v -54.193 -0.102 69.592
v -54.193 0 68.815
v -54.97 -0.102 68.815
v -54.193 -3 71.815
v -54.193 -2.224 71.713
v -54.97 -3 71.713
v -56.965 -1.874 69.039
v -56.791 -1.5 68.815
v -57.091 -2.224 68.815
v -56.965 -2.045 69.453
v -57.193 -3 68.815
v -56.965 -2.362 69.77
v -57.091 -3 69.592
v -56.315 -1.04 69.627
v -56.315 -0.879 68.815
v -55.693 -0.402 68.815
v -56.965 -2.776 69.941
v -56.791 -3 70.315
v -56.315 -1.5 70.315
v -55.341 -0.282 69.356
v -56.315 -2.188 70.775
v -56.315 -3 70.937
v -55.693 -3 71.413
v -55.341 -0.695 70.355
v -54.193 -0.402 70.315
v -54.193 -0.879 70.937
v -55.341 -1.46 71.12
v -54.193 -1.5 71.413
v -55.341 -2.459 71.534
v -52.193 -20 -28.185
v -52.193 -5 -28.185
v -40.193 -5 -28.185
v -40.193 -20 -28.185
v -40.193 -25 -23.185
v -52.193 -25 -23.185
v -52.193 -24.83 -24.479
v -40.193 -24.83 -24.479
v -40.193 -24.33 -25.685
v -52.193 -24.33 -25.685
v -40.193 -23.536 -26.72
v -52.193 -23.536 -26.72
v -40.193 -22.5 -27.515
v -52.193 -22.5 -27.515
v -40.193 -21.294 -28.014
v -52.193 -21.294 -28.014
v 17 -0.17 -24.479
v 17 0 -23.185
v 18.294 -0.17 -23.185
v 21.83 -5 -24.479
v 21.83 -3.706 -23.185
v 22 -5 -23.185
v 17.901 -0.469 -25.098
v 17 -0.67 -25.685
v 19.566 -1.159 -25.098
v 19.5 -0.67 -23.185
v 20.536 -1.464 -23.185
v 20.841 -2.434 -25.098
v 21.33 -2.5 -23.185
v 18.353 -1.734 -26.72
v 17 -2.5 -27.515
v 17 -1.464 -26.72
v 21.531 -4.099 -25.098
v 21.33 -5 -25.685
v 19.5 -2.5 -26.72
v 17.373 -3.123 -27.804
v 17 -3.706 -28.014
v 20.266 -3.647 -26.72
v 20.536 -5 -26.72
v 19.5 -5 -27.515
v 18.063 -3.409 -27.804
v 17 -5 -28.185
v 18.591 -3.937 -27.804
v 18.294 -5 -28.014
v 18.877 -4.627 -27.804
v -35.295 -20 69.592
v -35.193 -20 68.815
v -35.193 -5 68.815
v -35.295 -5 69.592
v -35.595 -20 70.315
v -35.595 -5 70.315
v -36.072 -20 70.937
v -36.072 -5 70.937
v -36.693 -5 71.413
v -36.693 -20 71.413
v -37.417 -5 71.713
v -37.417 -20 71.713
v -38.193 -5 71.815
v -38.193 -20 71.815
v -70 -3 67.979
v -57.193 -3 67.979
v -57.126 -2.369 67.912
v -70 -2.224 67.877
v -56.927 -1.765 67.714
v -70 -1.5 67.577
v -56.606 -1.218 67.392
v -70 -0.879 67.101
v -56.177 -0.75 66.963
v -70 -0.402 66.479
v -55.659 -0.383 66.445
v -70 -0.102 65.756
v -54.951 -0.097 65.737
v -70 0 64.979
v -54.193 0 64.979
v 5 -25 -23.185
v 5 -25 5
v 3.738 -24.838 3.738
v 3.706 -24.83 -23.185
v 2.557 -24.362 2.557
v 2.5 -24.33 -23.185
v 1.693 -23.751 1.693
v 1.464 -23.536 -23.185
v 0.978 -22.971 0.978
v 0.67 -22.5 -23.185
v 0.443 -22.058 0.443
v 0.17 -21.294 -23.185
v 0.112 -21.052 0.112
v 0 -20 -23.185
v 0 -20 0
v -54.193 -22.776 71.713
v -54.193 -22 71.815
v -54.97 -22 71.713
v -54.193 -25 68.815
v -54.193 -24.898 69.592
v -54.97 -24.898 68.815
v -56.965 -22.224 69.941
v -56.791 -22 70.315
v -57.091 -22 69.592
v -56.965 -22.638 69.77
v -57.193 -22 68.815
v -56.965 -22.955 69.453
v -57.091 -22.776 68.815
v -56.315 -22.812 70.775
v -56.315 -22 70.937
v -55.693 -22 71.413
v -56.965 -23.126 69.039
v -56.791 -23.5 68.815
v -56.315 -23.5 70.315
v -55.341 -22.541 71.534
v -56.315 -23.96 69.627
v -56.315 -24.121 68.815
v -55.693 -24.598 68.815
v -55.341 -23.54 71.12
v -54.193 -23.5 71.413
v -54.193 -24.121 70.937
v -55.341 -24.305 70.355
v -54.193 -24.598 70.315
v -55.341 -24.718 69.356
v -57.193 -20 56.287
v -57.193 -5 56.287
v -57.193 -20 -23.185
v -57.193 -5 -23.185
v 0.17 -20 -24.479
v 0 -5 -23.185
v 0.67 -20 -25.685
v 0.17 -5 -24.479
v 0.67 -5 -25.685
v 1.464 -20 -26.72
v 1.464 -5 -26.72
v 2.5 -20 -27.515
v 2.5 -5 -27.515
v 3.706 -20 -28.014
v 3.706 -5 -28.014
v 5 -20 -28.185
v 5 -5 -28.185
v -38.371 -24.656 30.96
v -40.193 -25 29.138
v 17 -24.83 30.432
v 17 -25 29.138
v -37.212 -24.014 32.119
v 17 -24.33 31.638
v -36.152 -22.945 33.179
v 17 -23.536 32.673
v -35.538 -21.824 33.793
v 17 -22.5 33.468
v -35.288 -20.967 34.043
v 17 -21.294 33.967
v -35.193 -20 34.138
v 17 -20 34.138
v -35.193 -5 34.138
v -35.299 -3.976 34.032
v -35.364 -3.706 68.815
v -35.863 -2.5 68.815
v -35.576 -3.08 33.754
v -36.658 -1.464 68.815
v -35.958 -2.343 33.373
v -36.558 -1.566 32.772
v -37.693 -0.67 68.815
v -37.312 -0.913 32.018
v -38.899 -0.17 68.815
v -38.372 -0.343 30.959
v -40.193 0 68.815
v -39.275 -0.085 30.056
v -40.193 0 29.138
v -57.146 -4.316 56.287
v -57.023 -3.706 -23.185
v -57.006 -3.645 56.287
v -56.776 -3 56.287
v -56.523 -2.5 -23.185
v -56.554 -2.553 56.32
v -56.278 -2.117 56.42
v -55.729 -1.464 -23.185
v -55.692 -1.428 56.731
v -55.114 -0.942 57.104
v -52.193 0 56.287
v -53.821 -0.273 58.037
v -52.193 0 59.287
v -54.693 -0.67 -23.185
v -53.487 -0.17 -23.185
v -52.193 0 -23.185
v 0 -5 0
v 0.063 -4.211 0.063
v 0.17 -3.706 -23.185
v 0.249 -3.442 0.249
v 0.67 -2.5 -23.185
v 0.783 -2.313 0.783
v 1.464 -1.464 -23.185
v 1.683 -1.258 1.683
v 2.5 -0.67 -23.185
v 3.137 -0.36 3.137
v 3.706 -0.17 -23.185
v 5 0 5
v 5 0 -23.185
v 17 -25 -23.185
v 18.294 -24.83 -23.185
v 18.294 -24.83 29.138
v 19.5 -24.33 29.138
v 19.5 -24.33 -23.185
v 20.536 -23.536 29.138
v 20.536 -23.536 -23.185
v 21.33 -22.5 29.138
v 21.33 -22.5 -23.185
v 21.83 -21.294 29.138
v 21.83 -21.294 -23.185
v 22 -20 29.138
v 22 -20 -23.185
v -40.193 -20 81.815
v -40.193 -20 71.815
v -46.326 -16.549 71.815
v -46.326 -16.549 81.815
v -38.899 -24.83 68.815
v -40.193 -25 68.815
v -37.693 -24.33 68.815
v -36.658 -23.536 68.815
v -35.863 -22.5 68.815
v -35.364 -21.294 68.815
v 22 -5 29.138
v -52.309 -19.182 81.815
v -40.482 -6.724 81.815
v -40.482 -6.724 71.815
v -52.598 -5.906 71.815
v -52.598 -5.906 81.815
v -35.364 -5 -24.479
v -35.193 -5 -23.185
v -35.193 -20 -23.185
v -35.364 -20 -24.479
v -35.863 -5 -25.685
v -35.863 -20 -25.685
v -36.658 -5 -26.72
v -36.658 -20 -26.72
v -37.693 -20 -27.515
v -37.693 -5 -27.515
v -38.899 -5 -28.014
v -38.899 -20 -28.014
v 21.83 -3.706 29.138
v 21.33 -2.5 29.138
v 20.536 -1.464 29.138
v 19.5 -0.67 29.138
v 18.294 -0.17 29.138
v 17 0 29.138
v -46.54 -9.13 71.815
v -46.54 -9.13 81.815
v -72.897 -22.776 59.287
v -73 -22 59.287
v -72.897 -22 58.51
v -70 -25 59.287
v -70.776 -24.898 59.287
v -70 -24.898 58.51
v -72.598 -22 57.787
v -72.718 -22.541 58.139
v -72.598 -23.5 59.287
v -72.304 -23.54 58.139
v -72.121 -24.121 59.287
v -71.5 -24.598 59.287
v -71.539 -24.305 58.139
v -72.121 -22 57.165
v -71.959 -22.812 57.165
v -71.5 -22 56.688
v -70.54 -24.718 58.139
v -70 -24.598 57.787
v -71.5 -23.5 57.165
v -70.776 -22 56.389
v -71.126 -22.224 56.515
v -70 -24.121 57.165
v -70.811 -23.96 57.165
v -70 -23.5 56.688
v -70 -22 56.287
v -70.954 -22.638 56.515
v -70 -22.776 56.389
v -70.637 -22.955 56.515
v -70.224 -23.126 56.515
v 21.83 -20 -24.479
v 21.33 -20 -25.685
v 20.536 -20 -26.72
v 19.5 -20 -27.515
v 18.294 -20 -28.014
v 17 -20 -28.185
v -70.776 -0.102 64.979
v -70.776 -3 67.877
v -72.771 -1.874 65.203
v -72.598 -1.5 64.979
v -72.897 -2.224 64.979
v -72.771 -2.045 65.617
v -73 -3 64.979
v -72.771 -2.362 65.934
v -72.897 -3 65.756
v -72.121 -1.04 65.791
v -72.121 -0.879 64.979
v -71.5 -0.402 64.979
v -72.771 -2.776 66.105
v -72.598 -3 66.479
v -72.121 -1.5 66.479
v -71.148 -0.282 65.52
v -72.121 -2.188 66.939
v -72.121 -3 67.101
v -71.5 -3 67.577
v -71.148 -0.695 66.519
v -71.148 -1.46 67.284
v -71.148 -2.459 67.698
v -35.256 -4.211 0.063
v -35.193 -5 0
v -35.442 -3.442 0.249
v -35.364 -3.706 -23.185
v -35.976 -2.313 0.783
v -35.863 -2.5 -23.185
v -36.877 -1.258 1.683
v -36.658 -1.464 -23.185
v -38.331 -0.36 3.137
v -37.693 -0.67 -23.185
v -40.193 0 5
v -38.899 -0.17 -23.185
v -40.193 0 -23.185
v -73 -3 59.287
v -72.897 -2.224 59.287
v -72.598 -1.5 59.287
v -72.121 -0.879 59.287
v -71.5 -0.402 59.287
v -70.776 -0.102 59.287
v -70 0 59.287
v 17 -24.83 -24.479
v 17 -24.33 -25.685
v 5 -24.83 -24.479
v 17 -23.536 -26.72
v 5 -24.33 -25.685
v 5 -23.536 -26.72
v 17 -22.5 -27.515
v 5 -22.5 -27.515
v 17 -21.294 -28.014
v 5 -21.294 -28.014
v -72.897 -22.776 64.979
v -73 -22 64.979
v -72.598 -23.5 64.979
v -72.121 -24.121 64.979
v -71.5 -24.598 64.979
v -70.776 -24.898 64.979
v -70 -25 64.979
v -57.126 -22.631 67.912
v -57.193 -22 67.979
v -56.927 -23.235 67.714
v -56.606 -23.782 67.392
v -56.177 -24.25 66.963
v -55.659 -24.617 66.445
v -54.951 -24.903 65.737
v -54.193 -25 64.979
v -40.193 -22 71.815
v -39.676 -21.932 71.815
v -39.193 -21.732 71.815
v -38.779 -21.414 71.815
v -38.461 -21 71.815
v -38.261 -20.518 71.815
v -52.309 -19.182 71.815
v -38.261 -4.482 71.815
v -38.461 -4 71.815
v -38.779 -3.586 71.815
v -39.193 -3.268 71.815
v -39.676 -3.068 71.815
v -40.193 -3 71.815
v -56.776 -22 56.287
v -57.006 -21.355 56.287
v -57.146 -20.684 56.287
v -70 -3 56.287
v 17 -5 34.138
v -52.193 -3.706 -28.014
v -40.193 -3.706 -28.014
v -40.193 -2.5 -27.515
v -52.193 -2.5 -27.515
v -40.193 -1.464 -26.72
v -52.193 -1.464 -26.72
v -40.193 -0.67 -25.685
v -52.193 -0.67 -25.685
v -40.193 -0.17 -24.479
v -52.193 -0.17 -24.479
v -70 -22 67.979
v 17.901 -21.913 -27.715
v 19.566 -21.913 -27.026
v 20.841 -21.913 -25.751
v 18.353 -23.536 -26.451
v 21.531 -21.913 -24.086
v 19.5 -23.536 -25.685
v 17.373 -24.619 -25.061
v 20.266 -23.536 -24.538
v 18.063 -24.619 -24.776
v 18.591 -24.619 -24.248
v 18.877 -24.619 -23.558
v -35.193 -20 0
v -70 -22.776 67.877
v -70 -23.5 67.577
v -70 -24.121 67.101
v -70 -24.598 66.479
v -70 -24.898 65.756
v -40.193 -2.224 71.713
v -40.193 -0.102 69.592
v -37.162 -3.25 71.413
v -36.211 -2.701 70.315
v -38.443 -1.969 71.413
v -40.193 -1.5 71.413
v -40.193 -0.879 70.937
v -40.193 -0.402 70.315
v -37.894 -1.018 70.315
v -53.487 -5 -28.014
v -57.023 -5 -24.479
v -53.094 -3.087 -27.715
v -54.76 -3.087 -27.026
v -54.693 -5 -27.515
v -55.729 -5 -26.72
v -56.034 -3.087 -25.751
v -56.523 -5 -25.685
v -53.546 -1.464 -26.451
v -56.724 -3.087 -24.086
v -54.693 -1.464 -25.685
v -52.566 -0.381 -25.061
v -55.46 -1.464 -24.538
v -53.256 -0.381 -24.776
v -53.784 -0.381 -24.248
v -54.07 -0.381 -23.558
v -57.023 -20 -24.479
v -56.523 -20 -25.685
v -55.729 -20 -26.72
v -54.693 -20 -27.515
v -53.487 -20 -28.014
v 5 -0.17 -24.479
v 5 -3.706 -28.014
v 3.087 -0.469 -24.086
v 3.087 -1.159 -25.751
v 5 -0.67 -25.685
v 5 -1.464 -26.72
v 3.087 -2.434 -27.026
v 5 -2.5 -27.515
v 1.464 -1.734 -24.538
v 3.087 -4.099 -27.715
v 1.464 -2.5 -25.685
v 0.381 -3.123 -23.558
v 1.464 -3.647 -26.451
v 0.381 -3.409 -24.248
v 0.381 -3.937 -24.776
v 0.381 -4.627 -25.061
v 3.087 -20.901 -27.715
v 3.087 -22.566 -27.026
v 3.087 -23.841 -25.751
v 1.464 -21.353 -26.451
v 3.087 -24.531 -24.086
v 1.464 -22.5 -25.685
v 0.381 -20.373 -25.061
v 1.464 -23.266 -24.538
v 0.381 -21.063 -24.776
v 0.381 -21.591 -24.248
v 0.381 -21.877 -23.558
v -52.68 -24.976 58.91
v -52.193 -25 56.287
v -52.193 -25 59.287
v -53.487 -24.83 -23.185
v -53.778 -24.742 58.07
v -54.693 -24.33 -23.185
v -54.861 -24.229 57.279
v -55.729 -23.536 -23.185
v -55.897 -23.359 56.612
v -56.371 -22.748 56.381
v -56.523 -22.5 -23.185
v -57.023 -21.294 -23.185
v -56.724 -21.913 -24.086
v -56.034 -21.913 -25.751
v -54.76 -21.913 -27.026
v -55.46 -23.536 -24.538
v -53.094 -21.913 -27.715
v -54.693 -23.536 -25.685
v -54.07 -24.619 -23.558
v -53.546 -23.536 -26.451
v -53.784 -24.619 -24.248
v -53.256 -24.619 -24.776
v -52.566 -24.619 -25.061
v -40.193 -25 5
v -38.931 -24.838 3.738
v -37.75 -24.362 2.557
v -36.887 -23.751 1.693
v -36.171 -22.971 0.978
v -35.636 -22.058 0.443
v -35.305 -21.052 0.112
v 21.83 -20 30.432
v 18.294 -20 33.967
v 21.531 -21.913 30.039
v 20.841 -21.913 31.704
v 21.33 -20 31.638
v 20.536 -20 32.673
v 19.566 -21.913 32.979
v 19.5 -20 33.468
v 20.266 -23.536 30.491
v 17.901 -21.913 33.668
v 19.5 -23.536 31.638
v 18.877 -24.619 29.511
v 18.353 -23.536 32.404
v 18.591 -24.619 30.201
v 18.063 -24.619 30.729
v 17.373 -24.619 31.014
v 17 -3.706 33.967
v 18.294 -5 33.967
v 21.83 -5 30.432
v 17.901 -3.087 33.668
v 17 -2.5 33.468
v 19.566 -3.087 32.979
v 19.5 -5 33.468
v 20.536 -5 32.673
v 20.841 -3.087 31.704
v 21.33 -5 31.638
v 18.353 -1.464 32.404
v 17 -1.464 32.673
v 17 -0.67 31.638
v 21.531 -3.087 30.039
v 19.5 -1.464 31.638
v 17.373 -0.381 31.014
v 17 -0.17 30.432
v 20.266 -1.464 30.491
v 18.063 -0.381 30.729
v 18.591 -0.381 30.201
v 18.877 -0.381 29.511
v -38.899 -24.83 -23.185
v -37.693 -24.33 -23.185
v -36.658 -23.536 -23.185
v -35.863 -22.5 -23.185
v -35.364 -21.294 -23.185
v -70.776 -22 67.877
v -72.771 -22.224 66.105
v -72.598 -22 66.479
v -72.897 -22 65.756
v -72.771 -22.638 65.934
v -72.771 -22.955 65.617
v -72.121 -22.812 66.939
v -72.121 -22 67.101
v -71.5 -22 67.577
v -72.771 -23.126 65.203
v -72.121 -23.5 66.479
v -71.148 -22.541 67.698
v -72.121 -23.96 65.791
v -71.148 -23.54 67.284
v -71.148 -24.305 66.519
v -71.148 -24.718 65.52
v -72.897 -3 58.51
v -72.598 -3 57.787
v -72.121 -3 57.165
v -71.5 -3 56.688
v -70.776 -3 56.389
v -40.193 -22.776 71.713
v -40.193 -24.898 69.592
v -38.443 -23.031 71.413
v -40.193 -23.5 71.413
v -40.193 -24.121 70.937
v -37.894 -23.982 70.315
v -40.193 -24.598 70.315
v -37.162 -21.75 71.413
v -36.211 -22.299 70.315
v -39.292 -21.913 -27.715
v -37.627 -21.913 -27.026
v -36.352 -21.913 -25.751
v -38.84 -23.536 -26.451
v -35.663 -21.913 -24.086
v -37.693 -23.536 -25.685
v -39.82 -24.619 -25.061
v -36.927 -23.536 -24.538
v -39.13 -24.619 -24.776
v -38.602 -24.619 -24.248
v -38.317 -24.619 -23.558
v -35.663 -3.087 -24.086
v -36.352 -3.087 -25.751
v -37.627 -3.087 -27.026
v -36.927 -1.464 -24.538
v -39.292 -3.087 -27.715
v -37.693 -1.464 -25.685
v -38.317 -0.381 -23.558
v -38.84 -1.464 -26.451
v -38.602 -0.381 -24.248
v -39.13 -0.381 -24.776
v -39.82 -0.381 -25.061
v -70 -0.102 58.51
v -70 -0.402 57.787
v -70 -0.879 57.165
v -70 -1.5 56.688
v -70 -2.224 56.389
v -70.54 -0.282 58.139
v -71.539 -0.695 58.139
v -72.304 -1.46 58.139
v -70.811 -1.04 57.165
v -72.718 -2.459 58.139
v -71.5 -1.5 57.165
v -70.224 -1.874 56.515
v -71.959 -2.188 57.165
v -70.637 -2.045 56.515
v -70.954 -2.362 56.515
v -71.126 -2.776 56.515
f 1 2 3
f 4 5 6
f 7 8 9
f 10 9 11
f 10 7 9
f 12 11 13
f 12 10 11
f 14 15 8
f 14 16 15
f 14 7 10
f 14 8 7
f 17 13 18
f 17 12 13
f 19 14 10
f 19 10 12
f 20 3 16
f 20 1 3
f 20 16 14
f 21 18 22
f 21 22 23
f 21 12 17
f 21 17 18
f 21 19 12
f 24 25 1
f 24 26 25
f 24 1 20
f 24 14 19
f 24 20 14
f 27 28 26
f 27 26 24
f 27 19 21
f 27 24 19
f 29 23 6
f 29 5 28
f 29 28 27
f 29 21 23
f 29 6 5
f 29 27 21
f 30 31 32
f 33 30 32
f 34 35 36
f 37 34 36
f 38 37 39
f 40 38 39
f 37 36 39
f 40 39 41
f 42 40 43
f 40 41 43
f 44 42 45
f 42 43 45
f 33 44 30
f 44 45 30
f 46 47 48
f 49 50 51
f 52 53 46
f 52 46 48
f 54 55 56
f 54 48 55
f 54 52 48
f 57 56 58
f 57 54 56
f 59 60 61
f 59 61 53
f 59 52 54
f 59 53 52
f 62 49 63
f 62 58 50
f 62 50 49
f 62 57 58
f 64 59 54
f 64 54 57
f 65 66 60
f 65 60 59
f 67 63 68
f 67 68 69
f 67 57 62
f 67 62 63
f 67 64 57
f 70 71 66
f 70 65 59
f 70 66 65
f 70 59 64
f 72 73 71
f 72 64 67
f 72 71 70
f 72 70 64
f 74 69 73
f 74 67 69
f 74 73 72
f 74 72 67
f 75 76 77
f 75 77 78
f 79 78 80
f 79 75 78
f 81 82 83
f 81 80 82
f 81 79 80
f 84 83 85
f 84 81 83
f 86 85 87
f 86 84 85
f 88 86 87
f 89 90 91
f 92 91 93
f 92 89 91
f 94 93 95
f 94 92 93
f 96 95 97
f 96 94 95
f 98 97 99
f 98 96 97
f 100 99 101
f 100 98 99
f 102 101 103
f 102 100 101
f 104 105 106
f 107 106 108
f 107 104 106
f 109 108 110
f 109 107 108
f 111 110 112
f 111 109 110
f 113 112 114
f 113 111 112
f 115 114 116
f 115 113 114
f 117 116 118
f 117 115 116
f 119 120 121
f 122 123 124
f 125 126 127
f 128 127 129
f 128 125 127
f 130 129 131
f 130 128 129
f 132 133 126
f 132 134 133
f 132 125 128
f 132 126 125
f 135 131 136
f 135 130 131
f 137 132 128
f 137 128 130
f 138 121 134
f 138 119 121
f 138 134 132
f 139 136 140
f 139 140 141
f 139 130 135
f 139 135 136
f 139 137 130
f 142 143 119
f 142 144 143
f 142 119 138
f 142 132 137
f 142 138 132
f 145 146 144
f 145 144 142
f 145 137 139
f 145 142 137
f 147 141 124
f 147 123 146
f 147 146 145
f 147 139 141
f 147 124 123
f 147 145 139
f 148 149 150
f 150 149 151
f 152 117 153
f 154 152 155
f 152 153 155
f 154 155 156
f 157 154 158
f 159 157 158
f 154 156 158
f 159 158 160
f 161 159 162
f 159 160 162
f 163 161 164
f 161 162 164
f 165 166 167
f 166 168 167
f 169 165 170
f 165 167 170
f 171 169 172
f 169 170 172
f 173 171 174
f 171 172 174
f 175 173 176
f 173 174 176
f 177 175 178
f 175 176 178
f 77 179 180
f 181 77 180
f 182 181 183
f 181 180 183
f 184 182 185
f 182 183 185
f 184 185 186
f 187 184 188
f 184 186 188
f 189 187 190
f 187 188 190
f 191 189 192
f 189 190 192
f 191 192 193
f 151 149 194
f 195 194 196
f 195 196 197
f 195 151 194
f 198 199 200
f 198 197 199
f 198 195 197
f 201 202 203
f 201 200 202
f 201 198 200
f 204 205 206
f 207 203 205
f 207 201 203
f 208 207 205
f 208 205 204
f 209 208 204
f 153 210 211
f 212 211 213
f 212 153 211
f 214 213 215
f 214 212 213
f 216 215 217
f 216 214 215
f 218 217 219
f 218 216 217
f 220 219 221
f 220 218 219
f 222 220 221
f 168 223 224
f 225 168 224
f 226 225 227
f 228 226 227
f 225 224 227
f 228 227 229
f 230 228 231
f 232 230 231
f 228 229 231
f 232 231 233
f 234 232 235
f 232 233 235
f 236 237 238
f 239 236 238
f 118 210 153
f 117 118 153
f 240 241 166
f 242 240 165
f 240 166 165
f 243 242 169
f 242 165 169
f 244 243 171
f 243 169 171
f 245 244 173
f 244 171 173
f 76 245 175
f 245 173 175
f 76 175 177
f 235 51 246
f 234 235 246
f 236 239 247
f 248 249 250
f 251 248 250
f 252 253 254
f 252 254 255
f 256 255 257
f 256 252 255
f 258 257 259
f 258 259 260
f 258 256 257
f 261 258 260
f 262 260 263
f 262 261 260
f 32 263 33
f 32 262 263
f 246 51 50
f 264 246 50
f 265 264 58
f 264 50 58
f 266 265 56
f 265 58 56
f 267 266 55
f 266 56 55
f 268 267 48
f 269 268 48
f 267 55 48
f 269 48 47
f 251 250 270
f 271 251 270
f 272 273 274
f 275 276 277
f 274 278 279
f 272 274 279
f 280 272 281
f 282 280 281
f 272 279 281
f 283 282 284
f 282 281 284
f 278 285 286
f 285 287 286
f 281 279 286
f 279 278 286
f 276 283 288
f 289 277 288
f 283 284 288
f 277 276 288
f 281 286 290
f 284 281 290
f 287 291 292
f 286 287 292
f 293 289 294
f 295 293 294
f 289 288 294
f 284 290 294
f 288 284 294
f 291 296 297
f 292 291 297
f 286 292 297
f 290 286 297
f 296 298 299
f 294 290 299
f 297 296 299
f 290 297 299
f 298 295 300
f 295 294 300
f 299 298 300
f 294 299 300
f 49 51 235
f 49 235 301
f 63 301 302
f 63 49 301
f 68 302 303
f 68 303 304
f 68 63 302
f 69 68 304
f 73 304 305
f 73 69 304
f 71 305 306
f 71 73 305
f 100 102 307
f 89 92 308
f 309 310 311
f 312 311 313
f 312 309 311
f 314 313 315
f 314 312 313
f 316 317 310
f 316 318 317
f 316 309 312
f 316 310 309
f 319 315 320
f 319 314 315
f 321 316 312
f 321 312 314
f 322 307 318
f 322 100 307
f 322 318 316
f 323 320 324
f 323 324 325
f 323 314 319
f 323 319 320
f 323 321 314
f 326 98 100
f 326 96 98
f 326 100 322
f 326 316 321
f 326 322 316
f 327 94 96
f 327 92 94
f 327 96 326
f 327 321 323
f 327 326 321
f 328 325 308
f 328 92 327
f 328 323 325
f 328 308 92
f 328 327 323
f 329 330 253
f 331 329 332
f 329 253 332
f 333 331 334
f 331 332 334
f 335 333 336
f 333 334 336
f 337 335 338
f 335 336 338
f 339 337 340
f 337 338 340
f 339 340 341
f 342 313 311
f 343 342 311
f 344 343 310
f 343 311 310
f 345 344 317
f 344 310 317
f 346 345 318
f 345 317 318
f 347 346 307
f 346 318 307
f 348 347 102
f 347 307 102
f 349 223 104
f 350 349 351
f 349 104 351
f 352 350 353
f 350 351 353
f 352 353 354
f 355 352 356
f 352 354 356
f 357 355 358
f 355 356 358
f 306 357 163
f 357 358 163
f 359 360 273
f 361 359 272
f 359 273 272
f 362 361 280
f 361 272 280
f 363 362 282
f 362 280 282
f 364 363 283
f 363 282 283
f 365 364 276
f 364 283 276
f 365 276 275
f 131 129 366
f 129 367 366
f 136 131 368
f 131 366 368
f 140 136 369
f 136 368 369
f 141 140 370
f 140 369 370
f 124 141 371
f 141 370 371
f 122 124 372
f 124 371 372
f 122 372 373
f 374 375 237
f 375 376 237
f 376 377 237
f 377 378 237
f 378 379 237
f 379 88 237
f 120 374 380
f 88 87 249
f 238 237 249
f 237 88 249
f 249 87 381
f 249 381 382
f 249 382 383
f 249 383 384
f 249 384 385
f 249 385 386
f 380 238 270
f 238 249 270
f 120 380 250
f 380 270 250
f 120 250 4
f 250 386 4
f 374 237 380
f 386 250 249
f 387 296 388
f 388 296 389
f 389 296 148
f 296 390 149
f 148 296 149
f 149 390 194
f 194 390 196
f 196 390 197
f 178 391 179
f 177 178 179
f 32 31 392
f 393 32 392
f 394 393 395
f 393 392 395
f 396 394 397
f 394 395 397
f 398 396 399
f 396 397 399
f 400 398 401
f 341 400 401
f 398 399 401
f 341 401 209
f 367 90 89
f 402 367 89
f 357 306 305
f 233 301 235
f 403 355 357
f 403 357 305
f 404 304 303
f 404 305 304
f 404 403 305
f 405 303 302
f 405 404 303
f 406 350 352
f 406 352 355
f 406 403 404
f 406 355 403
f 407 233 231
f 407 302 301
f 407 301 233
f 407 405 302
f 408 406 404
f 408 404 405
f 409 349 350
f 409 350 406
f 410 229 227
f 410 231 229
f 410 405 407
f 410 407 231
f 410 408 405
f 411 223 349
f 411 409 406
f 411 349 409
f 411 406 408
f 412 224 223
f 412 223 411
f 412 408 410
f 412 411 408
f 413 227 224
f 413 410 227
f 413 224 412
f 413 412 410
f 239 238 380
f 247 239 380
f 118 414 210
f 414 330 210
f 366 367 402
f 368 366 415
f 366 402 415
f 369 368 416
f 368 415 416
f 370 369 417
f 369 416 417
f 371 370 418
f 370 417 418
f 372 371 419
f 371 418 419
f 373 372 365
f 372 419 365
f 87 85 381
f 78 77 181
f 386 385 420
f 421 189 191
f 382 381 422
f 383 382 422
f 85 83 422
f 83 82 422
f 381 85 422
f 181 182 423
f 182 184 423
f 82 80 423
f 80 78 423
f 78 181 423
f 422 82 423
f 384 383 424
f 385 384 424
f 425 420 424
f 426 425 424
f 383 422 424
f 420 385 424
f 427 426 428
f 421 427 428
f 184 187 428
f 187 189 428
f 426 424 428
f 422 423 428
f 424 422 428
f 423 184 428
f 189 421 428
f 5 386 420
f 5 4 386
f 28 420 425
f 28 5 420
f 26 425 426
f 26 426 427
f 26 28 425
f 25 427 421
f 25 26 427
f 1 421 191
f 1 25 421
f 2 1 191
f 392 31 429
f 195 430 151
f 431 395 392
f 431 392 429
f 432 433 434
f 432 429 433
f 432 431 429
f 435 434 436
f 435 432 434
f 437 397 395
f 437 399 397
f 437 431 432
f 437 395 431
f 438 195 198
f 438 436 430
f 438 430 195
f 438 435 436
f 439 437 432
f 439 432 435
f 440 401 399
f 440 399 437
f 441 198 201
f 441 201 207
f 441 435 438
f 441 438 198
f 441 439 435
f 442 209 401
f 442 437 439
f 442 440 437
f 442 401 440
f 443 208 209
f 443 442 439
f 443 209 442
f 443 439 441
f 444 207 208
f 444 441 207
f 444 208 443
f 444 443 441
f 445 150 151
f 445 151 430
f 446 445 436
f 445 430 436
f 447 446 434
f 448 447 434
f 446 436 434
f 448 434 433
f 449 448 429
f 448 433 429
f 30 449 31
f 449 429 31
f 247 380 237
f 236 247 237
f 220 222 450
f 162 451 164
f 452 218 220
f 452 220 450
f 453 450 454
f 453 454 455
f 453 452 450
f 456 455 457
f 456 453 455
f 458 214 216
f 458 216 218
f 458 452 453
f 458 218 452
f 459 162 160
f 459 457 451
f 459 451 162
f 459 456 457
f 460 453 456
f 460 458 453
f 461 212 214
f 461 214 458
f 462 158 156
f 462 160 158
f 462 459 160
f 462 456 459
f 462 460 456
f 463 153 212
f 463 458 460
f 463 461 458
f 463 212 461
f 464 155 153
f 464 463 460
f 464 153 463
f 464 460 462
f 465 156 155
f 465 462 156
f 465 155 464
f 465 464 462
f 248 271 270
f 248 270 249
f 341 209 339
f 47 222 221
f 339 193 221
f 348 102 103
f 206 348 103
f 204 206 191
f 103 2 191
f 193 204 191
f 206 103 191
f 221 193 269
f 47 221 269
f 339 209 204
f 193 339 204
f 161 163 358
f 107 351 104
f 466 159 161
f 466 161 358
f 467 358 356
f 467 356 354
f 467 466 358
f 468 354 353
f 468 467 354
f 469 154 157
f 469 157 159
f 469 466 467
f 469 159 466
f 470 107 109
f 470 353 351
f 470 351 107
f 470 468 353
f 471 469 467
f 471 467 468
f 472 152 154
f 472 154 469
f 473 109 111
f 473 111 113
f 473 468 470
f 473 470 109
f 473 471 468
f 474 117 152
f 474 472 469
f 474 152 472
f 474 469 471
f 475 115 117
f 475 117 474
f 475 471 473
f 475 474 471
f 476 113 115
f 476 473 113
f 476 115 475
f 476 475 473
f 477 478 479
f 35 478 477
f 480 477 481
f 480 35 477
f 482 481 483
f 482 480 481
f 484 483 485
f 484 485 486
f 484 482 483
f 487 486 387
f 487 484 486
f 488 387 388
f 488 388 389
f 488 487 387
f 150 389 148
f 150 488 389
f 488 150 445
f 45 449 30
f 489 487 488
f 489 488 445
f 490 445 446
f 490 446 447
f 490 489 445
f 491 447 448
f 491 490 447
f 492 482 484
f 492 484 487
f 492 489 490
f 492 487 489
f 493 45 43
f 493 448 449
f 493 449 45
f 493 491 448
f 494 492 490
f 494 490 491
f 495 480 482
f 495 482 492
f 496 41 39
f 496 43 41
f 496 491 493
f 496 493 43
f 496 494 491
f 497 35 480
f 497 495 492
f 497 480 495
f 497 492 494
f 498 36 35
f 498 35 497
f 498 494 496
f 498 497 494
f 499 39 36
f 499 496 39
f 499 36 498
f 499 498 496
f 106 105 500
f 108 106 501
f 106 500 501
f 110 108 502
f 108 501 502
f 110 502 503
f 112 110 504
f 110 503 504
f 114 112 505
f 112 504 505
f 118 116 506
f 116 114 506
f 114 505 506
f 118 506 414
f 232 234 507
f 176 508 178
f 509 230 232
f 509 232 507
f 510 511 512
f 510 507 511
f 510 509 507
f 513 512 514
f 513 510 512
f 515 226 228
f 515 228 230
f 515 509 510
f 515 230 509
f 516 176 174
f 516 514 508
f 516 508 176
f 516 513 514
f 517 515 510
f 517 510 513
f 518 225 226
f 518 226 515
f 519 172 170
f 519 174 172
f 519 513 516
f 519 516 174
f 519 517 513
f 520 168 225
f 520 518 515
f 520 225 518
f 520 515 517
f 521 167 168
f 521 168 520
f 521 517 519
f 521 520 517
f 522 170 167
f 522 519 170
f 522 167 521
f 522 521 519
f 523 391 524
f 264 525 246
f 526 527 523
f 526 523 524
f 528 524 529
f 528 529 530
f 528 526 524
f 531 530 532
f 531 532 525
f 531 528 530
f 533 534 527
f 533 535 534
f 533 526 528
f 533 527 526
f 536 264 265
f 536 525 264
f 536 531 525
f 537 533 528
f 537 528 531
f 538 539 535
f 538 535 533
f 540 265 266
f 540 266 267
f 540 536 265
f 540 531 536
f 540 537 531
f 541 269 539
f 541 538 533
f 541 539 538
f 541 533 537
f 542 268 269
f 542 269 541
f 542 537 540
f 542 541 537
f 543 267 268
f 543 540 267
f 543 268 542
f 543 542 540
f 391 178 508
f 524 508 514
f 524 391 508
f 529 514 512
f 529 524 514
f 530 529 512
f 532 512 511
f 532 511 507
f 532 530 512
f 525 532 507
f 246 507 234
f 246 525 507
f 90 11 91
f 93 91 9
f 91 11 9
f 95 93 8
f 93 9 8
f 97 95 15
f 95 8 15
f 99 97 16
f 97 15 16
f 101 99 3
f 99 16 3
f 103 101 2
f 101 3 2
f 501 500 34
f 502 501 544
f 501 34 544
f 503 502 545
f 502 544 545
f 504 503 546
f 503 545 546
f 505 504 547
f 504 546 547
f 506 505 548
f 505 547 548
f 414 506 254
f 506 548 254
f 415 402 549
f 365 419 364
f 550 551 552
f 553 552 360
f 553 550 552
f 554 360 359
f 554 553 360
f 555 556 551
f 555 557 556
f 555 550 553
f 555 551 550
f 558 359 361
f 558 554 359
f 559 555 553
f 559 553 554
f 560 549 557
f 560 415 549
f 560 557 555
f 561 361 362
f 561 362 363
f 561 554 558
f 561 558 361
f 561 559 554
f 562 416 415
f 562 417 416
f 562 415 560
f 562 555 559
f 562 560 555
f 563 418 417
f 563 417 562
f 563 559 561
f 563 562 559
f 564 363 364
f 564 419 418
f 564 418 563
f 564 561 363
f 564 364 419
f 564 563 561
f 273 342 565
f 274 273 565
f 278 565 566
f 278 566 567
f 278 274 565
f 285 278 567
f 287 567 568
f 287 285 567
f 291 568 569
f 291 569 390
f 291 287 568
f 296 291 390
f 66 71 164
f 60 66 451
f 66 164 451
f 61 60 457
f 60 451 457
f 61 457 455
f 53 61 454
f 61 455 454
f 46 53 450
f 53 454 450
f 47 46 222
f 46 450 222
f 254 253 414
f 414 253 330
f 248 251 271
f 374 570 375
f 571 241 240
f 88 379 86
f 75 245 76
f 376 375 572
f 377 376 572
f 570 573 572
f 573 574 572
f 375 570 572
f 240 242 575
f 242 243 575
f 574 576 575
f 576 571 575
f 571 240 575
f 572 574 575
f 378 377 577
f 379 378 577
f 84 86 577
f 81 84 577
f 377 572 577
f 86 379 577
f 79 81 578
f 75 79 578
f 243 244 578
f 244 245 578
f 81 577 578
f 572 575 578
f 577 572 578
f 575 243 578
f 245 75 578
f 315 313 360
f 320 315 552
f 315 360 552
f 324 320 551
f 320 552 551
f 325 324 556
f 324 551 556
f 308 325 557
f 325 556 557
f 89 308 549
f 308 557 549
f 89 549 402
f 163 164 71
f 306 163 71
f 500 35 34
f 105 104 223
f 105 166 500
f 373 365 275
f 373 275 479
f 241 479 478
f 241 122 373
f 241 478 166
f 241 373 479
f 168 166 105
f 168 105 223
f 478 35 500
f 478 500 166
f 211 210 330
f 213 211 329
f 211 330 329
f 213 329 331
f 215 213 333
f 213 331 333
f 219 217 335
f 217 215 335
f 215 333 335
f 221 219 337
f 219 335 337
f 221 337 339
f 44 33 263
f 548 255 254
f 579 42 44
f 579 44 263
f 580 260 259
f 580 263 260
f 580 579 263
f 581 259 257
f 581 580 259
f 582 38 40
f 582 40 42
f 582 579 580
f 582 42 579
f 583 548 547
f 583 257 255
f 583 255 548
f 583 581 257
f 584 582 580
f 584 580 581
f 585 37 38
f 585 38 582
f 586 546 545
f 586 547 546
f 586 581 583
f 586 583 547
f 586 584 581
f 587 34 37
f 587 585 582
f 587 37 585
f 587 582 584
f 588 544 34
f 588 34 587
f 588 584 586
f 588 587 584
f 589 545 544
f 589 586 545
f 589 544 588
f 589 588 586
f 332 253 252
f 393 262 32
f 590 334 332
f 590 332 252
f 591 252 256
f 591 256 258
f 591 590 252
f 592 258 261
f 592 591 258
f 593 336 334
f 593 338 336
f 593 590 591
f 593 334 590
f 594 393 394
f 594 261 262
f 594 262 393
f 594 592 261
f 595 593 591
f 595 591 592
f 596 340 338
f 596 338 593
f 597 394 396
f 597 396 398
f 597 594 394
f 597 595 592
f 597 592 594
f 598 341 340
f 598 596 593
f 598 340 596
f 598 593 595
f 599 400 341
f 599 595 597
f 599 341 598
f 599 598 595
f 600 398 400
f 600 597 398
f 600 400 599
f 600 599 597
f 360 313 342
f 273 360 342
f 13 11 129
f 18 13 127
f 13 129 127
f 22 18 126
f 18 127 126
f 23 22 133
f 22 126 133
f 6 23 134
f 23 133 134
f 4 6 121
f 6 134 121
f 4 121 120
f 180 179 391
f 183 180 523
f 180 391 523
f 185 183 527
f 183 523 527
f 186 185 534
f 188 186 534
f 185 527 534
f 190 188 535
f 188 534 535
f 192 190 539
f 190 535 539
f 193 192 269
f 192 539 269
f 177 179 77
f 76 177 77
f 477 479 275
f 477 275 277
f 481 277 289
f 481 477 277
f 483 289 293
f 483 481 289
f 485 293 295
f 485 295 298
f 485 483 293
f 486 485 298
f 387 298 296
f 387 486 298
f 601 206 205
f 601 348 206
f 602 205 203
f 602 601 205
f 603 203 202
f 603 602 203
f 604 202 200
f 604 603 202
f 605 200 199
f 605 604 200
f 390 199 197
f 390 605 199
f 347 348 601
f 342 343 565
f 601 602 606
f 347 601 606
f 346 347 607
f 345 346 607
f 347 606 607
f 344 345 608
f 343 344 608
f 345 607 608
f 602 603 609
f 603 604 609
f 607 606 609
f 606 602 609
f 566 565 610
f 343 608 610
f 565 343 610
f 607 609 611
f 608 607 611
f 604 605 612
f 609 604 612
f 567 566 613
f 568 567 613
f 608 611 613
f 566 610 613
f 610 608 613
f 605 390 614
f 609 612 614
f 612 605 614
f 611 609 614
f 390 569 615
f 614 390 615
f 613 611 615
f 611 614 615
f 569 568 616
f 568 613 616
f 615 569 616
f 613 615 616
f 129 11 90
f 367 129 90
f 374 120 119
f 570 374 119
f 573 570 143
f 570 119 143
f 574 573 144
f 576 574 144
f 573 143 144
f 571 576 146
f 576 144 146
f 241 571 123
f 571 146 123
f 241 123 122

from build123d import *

# Parameters (mm, degrees)
F1_DEPTH      = 25
F2_R          = 3
F3_R          = 3
F4_T1_DEPTH   = 52.1931828042
F4_T3_DEPTH   = 15
F4_T5_DEPTH   = 52.3223032383
F4_T7_DEPTH   = 40.6846483105
F4_T9_DEPTH   = 79.471221308
F4_T11_DEPTH  = 23.1846483105
F4_T13_DEPTH  = 35.1931828042
F4_T15_DEPTH  = 12
F4_T17_DEPTH  = 29.5
F4_T19_DEPTH  = 37.6776967617
F4_T22_ANGLE  = 90
F4_T24_ANGLE  = 90
F4_S27_W      = 5.1
F4_S27_H      = 5.1
F4_T28_DEPTH  = 5.1
F4_S33_W      = 5.1
F4_S33_H      = 5.1
F4_T34_DEPTH  = 5.1
F4_S39_W      = 5.1
F4_S39_H      = 5.1
F4_T40_DEPTH  = 5.1
F4_S45_W      = 5.1
F4_S45_H      = 5.1
F4_T46_DEPTH  = 5.1
F4_S51_W      = 5.1
F4_S51_H      = 5.1
F4_T52_DEPTH  = 5.1
F4_S57_W      = 5.1
F4_S57_H      = 5.1
F4_T58_DEPTH  = 5.1
F4_S63_W      = 5.1
F4_S63_H      = 5.1
F4_T64_DEPTH  = 5.1
F4_S69_W      = 5.1
F4_S69_H      = 5.1
F4_T70_DEPTH  = 5.1
F4_T77_DEPTH  = 50.1776967617
F4_T81_DEPTH  = 64.6931828042
F4_T88_DEPTH  = 50.1776967617
F4_T92_DEPTH  = 64.6931828042
F4_T99_DEPTH  = 40.6846483105
F4_T103_DEPTH = 47.6931828042
F4_T110_DEPTH = 40.6846483105
F4_T114_DEPTH = 47.6931828042
F4_T121_DEPTH = 47.6931828042
F4_T125_DEPTH = 35.6846483105
F4_T132_DEPTH = 47.6931828042
F4_T136_DEPTH = 35.6846483105
F5_R          = 3
F6_T1_DEPTH   = 15
F6_S5_W       = 5
F6_S5_H       = 5
F6_T6_DEPTH   = 5
F6_S11_W      = 5
F6_S11_H      = 5
F6_T12_DEPTH  = 5
F8_DEPTH      = 10


# Not quite as in the source:
# - a fillet or chamfer that OpenCascade refuses, or shapes differently, is made with other operations: its cross-section is extruded or revolved along the edge and cut away or added


with BuildPart() as f1:
    # F0 (on Front) → F1 (new body)
    with BuildSketch(Plane.XZ):
        Polygon((-57.1931828042, 56.2865729975), (-57.1931828042, -28.1846483105), (-35.1931828042, -28.1846483105), (-35.1931828042, 0), (0, 0), (0, -28.1846483105), (22, -28.1846483105), (22, 0), (22, 34.1376549277), (-35.1931828042, 34.1376549277), (-35.1931828042, 71.8153516895), (-57.1931828042, 71.8153516895), (-57.1931828042, 67.9793483567), (-72.9995634697, 67.9793483567), (-72.9995634697, 56.2865729975), align=None)
    extrude(amount=F1_DEPTH)

    # F2
    f2_edges = [f1.edges().sort_by_distance(p)[0] for p in [
        (-46.193183, -25, 71.815352),
        (-35.193183, -12.5, 71.815352),
        (-46.193183, 0, 71.815352),
        (-65.096373, -25, 67.979348),
        (-65.096373, 0, 67.979348),
    ]]
    fillet(f2_edges, radius=F2_R)

    # F3
    f3_edges = [f1.edges().sort_by_distance(p)[0] for p in [
        (-57.193183, -12.5, 71.815352),
        (-72.999563, -12.5, 67.979348),
    ]]
    fillet(f3_edges, radius=F3_R)

    # F4: fillet of radius 5 on 22 edges, made by hand

    # F4_s2 → F4_t1 (cut)
    with BuildSketch(Plane.YZ.offset(-35.1931828042)):
        with BuildLine():
            ThreePointArc((-25, 29.1376549277), (-23.5355339059, 32.6731888337), (-20, 34.1376549277))
            Line((-20, 34.1376549277), (-25, 34.1376549277))
            Line((-25, 34.1376549277), (-25, 29.1376549277))
        make_face()
        with BuildLine():
            ThreePointArc((-5, 34.1376549277), (-1.4644660941, 32.6731888337), (0, 29.1376549277))
            Line((0, 29.1376549277), (0, 34.1376549277))
            Line((0, 34.1376549277), (-5, 34.1376549277))
        make_face()
    extrude(amount=F4_T1_DEPTH, mode=Mode.SUBTRACT)

    # F4_s4 → F4_t3 (cut)
    with BuildSketch(Plane.XZ.offset(5)):
        with BuildLine():
            ThreePointArc((17, 34.1376549277), (20.5355339059, 32.6731888337), (22, 29.1376549277))
            Line((22, 29.1376549277), (22, 34.1376549277))
            Line((22, 34.1376549277), (17, 34.1376549277))
        make_face()
        with BuildLine():
            ThreePointArc((-57.1931828042, -23.1846483105), (-55.7287167101, -26.7201822165), (-52.1931828042, -28.1846483105))
            Line((-52.1931828042, -28.1846483105), (-57.1931828042, -28.1846483105))
            Line((-57.1931828042, -28.1846483105), (-57.1931828042, -23.1846483105))
        make_face()
        with BuildLine():
            ThreePointArc((-35.1931828042, -23.1846483105), (-36.6576488983, -26.7201822165), (-40.1931828042, -28.1846483105))
            Line((-40.1931828042, -28.1846483105), (-35.1931828042, -28.1846483105))
            Line((-35.1931828042, -28.1846483105), (-35.1931828042, -23.1846483105))
        make_face()
        with BuildLine():
            ThreePointArc((22, -23.1846483105), (20.5355339059, -26.7201822165), (17, -28.1846483105))
            Line((17, -28.1846483105), (22, -28.1846483105))
            Line((22, -28.1846483105), (22, -23.1846483105))
        make_face()
    extrude(amount=F4_T3_DEPTH, mode=Mode.SUBTRACT)

    # F4_s6 → F4_t5 (cut)
    with BuildSketch(Plane.XY.offset(-23.1846483105)):
        with BuildLine():
            ThreePointArc((17, -25), (20.5355339059, -23.5355339059), (22, -20))
            Line((22, -20), (22, -25))
            Line((22, -25), (17, -25))
        make_face()
        with BuildLine():
            ThreePointArc((22, -5), (20.5355339059, -1.4644660941), (17, 0))
            Line((17, 0), (22, 0))
            Line((22, 0), (22, -5))
        make_face()
    extrude(amount=F4_T5_DEPTH, mode=Mode.SUBTRACT)

    # F4_s8 → F4_t7 (cut)
    with BuildSketch(Plane.XY.offset(-40.6846483105)):
        with BuildLine():
            ThreePointArc((0, -5), (1.4644660941, -1.4644660941), (5, 0))
            Line((5, 0), (0, 0))
            Line((0, 0), (0, -5))
        make_face()
        with BuildLine():
            ThreePointArc((5, -25), (1.4644660941, -23.5355339059), (0, -20))
            Line((0, -20), (0, -25))
            Line((0, -25), (5, -25))
        make_face()
    extrude(amount=F4_T7_DEPTH, mode=Mode.SUBTRACT)

    # F4_s10 → F4_t9 (cut)
    with BuildSketch(Plane.XY.offset(-23.1846483105)):
        with BuildLine():
            ThreePointArc((-57.1931828042, -5), (-55.7287167101, -1.4644660941), (-52.1931828042, 0))
            Line((-52.1931828042, 0), (-57.1931828042, 0))
            Line((-57.1931828042, 0), (-57.1931828042, -5))
        make_face()
        with BuildLine():
            ThreePointArc((-52.1931828042, -25), (-55.7287167101, -23.5355339059), (-57.1931828042, -20))
            Line((-57.1931828042, -20), (-57.1931828042, -25))
            Line((-57.1931828042, -25), (-52.1931828042, -25))
        make_face()
    extrude(amount=F4_T9_DEPTH, mode=Mode.SUBTRACT)

    # F4_s12 → F4_t11 (cut)
    with BuildSketch(Plane.XY.offset(-23.1846483105)):
        with BuildLine():
            ThreePointArc((-40.1931828042, -25), (-36.6576488983, -23.5355339059), (-35.1931828042, -20))
            Line((-35.1931828042, -20), (-35.1931828042, -25))
            Line((-35.1931828042, -25), (-40.1931828042, -25))
        make_face()
        with BuildLine():
            ThreePointArc((-35.1931828042, -5), (-36.6576488983, -1.4644660941), (-40.1931828042, 0))
            Line((-40.1931828042, 0), (-35.1931828042, 0))
            Line((-35.1931828042, 0), (-35.1931828042, -5))
        make_face()
    extrude(amount=F4_T11_DEPTH, mode=Mode.SUBTRACT)

    # F4_s14 → F4_t13 (cut)
    with BuildSketch(Plane.YZ.offset(-35.1931828042)):
        with BuildLine():
            ThreePointArc((-25, 5), (-23.5355339059, 1.4644660941), (-20, 0))
            Line((-20, 0), (-25, 0))
            Line((-25, 0), (-25, 5))
        make_face()
        with BuildLine():
            ThreePointArc((-5, 0), (-1.4644660941, 1.4644660941), (0, 5))
            Line((0, 5), (0, 0))
            Line((0, 0), (-5, 0))
        make_face()
    extrude(amount=F4_T13_DEPTH, mode=Mode.SUBTRACT)

    # F4_s16 → F4_t15 (cut)
    with BuildSketch(Plane.YZ.offset(-52.1931828042)):
        with BuildLine():
            ThreePointArc((-25, -23.1846483105), (-23.5355339059, -26.7201822165), (-20, -28.1846483105))
            Line((-20, -28.1846483105), (-25, -28.1846483105))
            Line((-25, -28.1846483105), (-25, -23.1846483105))
        make_face()
        with BuildLine():
            ThreePointArc((-5, -28.1846483105), (-1.4644660941, -26.7201822165), (0, -23.1846483105))
            Line((0, -23.1846483105), (0, -28.1846483105))
            Line((0, -28.1846483105), (-5, -28.1846483105))
        make_face()
    extrude(amount=F4_T15_DEPTH, mode=Mode.SUBTRACT)

    # F4_s18 → F4_t17 (cut)
    with BuildSketch(Plane.YZ.offset(-12.5)):
        with BuildLine():
            ThreePointArc((-25, -23.1846483105), (-23.5355339059, -26.7201822165), (-20, -28.1846483105))
            Line((-20, -28.1846483105), (-25, -28.1846483105))
            Line((-25, -28.1846483105), (-25, -23.1846483105))
        make_face()
        with BuildLine():
            ThreePointArc((-5, -28.1846483105), (-1.4644660941, -26.7201822165), (0, -23.1846483105))
            Line((0, -23.1846483105), (0, -28.1846483105))
            Line((0, -28.1846483105), (-5, -28.1846483105))
        make_face()
    extrude(amount=F4_T17_DEPTH, mode=Mode.SUBTRACT)

    # F4_s20 → F4_t19 (cut)
    with BuildSketch(Plane.XY.offset(34.1376549277)):
        with BuildLine():
            ThreePointArc((-40.1931828042, -25), (-36.6576488983, -23.5355339059), (-35.1931828042, -20))
            Line((-35.1931828042, -20), (-35.1931828042, -25))
            Line((-35.1931828042, -25), (-40.1931828042, -25))
        make_face()
        with BuildLine():
            ThreePointArc((-35.1931828042, -5), (-36.6576488983, -1.4644660941), (-40.1931828042, 0))
            Line((-40.1931828042, 0), (-35.1931828042, 0))
            Line((-35.1931828042, 0), (-35.1931828042, -5))
        make_face()
    extrude(amount=F4_T19_DEPTH, mode=Mode.SUBTRACT)

    # F4_s21 → F4_t22 (revolve, cut)
    with BuildSketch(Plane.XZ.offset(5)):
        with BuildLine():
            ThreePointArc((-38.1931828042, 71.8153516895), (-36.0718624607, 70.936672033), (-35.1931828042, 68.8153516895))
            Line((-35.1931828042, 68.8153516895), (-35.1931828042, 71.8153516895))
            Line((-35.1931828042, 71.8153516895), (-38.1931828042, 71.8153516895))
        make_face()
    revolve(axis=Axis((-40.1931828042, -5, 71.8153516895), (0, 0, 1)), revolution_arc=F4_T22_ANGLE, mode=Mode.SUBTRACT)

    # F4_s23 → F4_t24 (revolve, cut)
    with BuildSketch(Plane.YZ.offset(-40.1931828042)):
        with BuildLine():
            ThreePointArc((-22, 71.8153516895), (-24.1213203436, 70.936672033), (-25, 68.8153516895))
            Line((-25, 68.8153516895), (-25, 71.8153516895))
            Line((-25, 71.8153516895), (-22, 71.8153516895))
        make_face()
    revolve(axis=Axis((-40.1931828042, -20, 71.8153516895), (0, 0, 1)), revolution_arc=F4_T24_ANGLE, mode=Mode.SUBTRACT)


with BuildPart() as f4_tool26:
    # F4_s27 → F4_t28 (new body)
    with BuildSketch(Plane.XZ.offset(20)):
        with Locations((19.55, 31.6876549277)):
            Rectangle(F4_S27_W, F4_S27_H)
    extrude(amount=F4_T28_DEPTH)

    # F4_s29 → F4_t30 (revolve, cut)
    with BuildSketch(Plane(origin=(17, -20, 29.1376549277), x_dir=(-0.7071067812, 0, -0.7071067812), z_dir=(-0.7071067812, 0, 0.7071067812))):
        with BuildLine():
            ThreePointArc((0, -5), (5, 0), (0, 5))
            Line((0, 5), (0, -5))
        make_face()
    revolve(axis=Axis((17, -20, 29.1376549277), (0, -1, 0)), mode=Mode.SUBTRACT)


with BuildPart() as f1_1:
    add(f1.part)

    # F4_t25: cut F4_tool26
    add(f4_tool26.part, mode=Mode.SUBTRACT)


with BuildPart() as f4_tool32:
    # F4_s33 → F4_t34 (new body)
    with BuildSketch(Plane.XZ.offset(5)):
        with Locations((19.55, 31.6876549277)):
            Rectangle(F4_S33_W, F4_S33_H)
    extrude(amount=-F4_T34_DEPTH)

    # F4_s35 → F4_t36 (revolve, cut)
    with BuildSketch(Plane(origin=(17, -5, 29.1376549277), x_dir=(-0.7071067812, 0, -0.7071067812), z_dir=(0.7071067812, 0, -0.7071067812))):
        with BuildLine():
            ThreePointArc((0, -5), (5, 0), (0, 5))
            Line((0, 5), (0, -5))
        make_face()
    revolve(axis=Axis((17, -5, 29.1376549277), (0, 1, 0)), mode=Mode.SUBTRACT)


with BuildPart() as f1_2:
    add(f1_1.part)

    # F4_t31: cut F4_tool32
    add(f4_tool32.part, mode=Mode.SUBTRACT)


with BuildPart() as f4_tool38:
    # F4_s39 → F4_t40 (new body)
    with BuildSketch(Plane.XZ.offset(20)):
        with Locations((19.55, -25.7346483105)):
            Rectangle(F4_S39_W, F4_S39_H)
    extrude(amount=F4_T40_DEPTH)

    # F4_s41 → F4_t42 (revolve, cut)
    with BuildSketch(Plane(origin=(17, -20, -23.1846483105), x_dir=(-0.7071067812, 0, 0.7071067812), z_dir=(0.7071067812, 0, 0.7071067812))):
        with BuildLine():
            ThreePointArc((0, -5), (5, 0), (0, 5))
            Line((0, 5), (0, -5))
        make_face()
    revolve(axis=Axis((17, -20, -23.1846483105), (0, -1, 0)), mode=Mode.SUBTRACT)


with BuildPart() as f1_3:
    add(f1_2.part)

    # F4_t37: cut F4_tool38
    add(f4_tool38.part, mode=Mode.SUBTRACT)


with BuildPart() as f4_tool44:
    # F4_s45 → F4_t46 (new body)
    with BuildSketch(Plane.XZ.offset(5)):
        with Locations((-54.7431828042, -25.7346483105)):
            Rectangle(F4_S45_W, F4_S45_H)
    extrude(amount=-F4_T46_DEPTH)

    # F4_s47 → F4_t48 (revolve, cut)
    with BuildSketch(Plane(origin=(-52.1931828042, -5, -23.1846483105), x_dir=(0.7071067812, 0, 0.7071067812), z_dir=(-0.7071067812, 0, 0.7071067812))):
        with BuildLine():
            ThreePointArc((0, -5), (5, 0), (0, 5))
            Line((0, 5), (0, -5))
        make_face()
    revolve(axis=Axis((-52.1931828042, -5, -23.1846483105), (0, 1, 0)), mode=Mode.SUBTRACT)


with BuildPart() as f1_4:
    add(f1_3.part)

    # F4_t43: cut F4_tool44
    add(f4_tool44.part, mode=Mode.SUBTRACT)


with BuildPart() as f4_tool50:
    # F4_s51 → F4_t52 (new body)
    with BuildSketch(Plane.XZ.offset(20)):
        with Locations((-54.7431828042, -25.7346483105)):
            Rectangle(F4_S51_W, F4_S51_H)
    extrude(amount=F4_T52_DEPTH)

    # F4_s53 → F4_t54 (revolve, cut)
    with BuildSketch(Plane(origin=(-52.1931828042, -20, -23.1846483105), x_dir=(0.7071067812, 0, 0.7071067812), z_dir=(0.7071067812, 0, -0.7071067812))):
        with BuildLine():
            ThreePointArc((0, -5), (5, 0), (0, 5))
            Line((0, 5), (0, -5))
        make_face()
    revolve(axis=Axis((-52.1931828042, -20, -23.1846483105), (0, -1, 0)), mode=Mode.SUBTRACT)


with BuildPart() as f1_5:
    add(f1_4.part)

    # F4_t49: cut F4_tool50
    add(f4_tool50.part, mode=Mode.SUBTRACT)


with BuildPart() as f4_tool56:
    # F4_s57 → F4_t58 (new body)
    with BuildSketch(Plane.XZ.offset(20)):
        with Locations((-37.6431828042, -25.7346483105)):
            Rectangle(F4_S57_W, F4_S57_H)
    extrude(amount=F4_T58_DEPTH)

    # F4_s59 → F4_t60 (revolve, cut)
    with BuildSketch(Plane(origin=(-40.1931828042, -20, -23.1846483105), x_dir=(-0.7071067812, 0, 0.7071067812), z_dir=(0.7071067812, 0, 0.7071067812))):
        with BuildLine():
            ThreePointArc((0, -5), (5, 0), (0, 5))
            Line((0, 5), (0, -5))
        make_face()
    revolve(axis=Axis((-40.1931828042, -20, -23.1846483105), (0, -1, 0)), mode=Mode.SUBTRACT)


with BuildPart() as f1_6:
    add(f1_5.part)

    # F4_t55: cut F4_tool56
    add(f4_tool56.part, mode=Mode.SUBTRACT)


with BuildPart() as f4_tool62:
    # F4_s63 → F4_t64 (new body)
    with BuildSketch(Plane.XZ.offset(5)):
        with Locations((-37.6431828042, -25.7346483105)):
            Rectangle(F4_S63_W, F4_S63_H)
    extrude(amount=-F4_T64_DEPTH)

    # F4_s65 → F4_t66 (revolve, cut)
    with BuildSketch(Plane(origin=(-40.1931828042, -5, -23.1846483105), x_dir=(-0.7071067812, 0, 0.7071067812), z_dir=(-0.7071067812, 0, -0.7071067812))):
        with BuildLine():
            ThreePointArc((0, -5), (5, 0), (0, 5))
            Line((0, 5), (0, -5))
        make_face()
    revolve(axis=Axis((-40.1931828042, -5, -23.1846483105), (0, 1, 0)), mode=Mode.SUBTRACT)


with BuildPart() as f1_7:
    add(f1_6.part)

    # F4_t61: cut F4_tool62
    add(f4_tool62.part, mode=Mode.SUBTRACT)


with BuildPart() as f4_tool68:
    # F4_s69 → F4_t70 (new body)
    with BuildSketch(Plane.XY.offset(-23.1846483105)):
        with Locations((19.55, -2.45)):
            Rectangle(F4_S69_W, F4_S69_H)
    extrude(amount=-F4_T70_DEPTH)

    # F4_s71 → F4_t72 (revolve, cut)
    with BuildSketch(Plane(origin=(17, -5, -23.1846483105), x_dir=(-0.7071067812, -0.7071067812, 0), z_dir=(0.7071067812, -0.7071067812, 0))):
        with BuildLine():
            ThreePointArc((0, -5), (5, 0), (0, 5))
            Line((0, 5), (0, -5))
        make_face()
    revolve(axis=Axis((17, -5, -23.1846483105), (0, 0, -1)), mode=Mode.SUBTRACT)


with BuildPart() as f1_8:
    add(f1_7.part)

    # F4_t67: cut F4_tool68
    add(f4_tool68.part, mode=Mode.SUBTRACT)


with BuildPart() as f4_tool75:
    # F4_s76 → F4_t77 (new body)
    with BuildSketch(Plane.XY.offset(21.6376549277)):
        with BuildLine():
            ThreePointArc((-40.1931828042, -25), (-36.6576488983, -23.5355339059), (-35.1931828042, -20))
            Line((-35.1931828042, -20), (-35.1931828042, -25))
            Line((-35.1931828042, -25), (-40.1931828042, -25))
        make_face()
    extrude(amount=F4_T77_DEPTH)

    split(bisect_by=Plane.XY.offset(34.1376549277), keep=Keep.BOTTOM)


with BuildPart() as f4_tool79:
    # F4_s80 → F4_t81 (new body)
    with BuildSketch(Plane.YZ.offset(17)):
        with BuildLine():
            ThreePointArc((-25, 29.1376549277), (-23.5355339059, 32.6731888337), (-20, 34.1376549277))
            Line((-20, 34.1376549277), (-25, 34.1376549277))
            Line((-25, 34.1376549277), (-25, 29.1376549277))
        make_face()
    extrude(amount=-F4_T81_DEPTH)

    split(bisect_by=Plane.YZ.offset(-35.1931828042), keep=Keep.BOTTOM)


with BuildPart() as f4_tool75_1:
    add(f4_tool75.part)

    # F4_t83: intersect F4_tool79
    add(f4_tool79.part, mode=Mode.INTERSECT)


with BuildPart() as f1_9:
    add(f1_8.part)

    # F4_t73: cut F4_tool75
    add(f4_tool75_1.part, mode=Mode.SUBTRACT)


with BuildPart() as f4_tool86:
    # F4_s87 → F4_t88 (new body)
    with BuildSketch(Plane.XY.offset(21.6376549277)):
        with BuildLine():
            ThreePointArc((-35.1931828042, -5), (-36.6576488983, -1.4644660941), (-40.1931828042, 0))
            Line((-40.1931828042, 0), (-35.1931828042, 0))
            Line((-35.1931828042, 0), (-35.1931828042, -5))
        make_face()
    extrude(amount=F4_T88_DEPTH)

    split(bisect_by=Plane.XY.offset(34.1376549277), keep=Keep.BOTTOM)


with BuildPart() as f4_tool90:
    # F4_s91 → F4_t92 (new body)
    with BuildSketch(Plane.YZ.offset(17)):
        with BuildLine():
            ThreePointArc((-5, 34.1376549277), (-1.4644660941, 32.6731888337), (0, 29.1376549277))
            Line((0, 29.1376549277), (0, 34.1376549277))
            Line((0, 34.1376549277), (-5, 34.1376549277))
        make_face()
    extrude(amount=-F4_T92_DEPTH)

    split(bisect_by=Plane.YZ.offset(-35.1931828042), keep=Keep.BOTTOM)


with BuildPart() as f4_tool86_1:
    add(f4_tool86.part)

    # F4_t94: intersect F4_tool90
    add(f4_tool90.part, mode=Mode.INTERSECT)


with BuildPart() as f1_10:
    add(f1_9.part)

    # F4_t84: cut F4_tool86
    add(f4_tool86_1.part, mode=Mode.SUBTRACT)


with BuildPart() as f4_tool97:
    # F4_s98 → F4_t99 (new body)
    with BuildSketch(Plane.XY.offset(12.5)):
        with BuildLine():
            ThreePointArc((0, -5), (1.4644660941, -1.4644660941), (5, 0))
            Line((5, 0), (0, 0))
            Line((0, 0), (0, -5))
        make_face()
    extrude(amount=-F4_T99_DEPTH)

    split(bisect_by=Plane.XY, keep=Keep.TOP)


with BuildPart() as f4_tool101:
    # F4_s102 → F4_t103 (new body)
    with BuildSketch(Plane.YZ.offset(-35.1931828042)):
        with BuildLine():
            ThreePointArc((-5, 0), (-1.4644660941, 1.4644660941), (0, 5))
            Line((0, 5), (0, 0))
            Line((0, 0), (-5, 0))
        make_face()
    extrude(amount=F4_T103_DEPTH)

    split(bisect_by=Plane.YZ, keep=Keep.TOP)


with BuildPart() as f4_tool97_1:
    add(f4_tool97.part)

    # F4_t105: intersect F4_tool101
    add(f4_tool101.part, mode=Mode.INTERSECT)


with BuildPart() as f1_11:
    add(f1_10.part)

    # F4_t95: cut F4_tool97
    add(f4_tool97_1.part, mode=Mode.SUBTRACT)


with BuildPart() as f4_tool108:
    # F4_s109 → F4_t110 (new body)
    with BuildSketch(Plane.XY.offset(12.5)):
        with BuildLine():
            ThreePointArc((5, -25), (1.4644660941, -23.5355339059), (0, -20))
            Line((0, -20), (0, -25))
            Line((0, -25), (5, -25))
        make_face()
    extrude(amount=-F4_T110_DEPTH)

    split(bisect_by=Plane.XY, keep=Keep.TOP)


with BuildPart() as f4_tool112:
    # F4_s113 → F4_t114 (new body)
    with BuildSketch(Plane.YZ.offset(-35.1931828042)):
        with BuildLine():
            ThreePointArc((-25, 5), (-23.5355339059, 1.4644660941), (-20, 0))
            Line((-20, 0), (-25, 0))
            Line((-25, 0), (-25, 5))
        make_face()
    extrude(amount=F4_T114_DEPTH)

    split(bisect_by=Plane.YZ, keep=Keep.TOP)


with BuildPart() as f4_tool108_1:
    add(f4_tool108.part)

    # F4_t116: intersect F4_tool112
    add(f4_tool112.part, mode=Mode.INTERSECT)


with BuildPart() as f1_12:
    add(f1_11.part)

    # F4_t106: cut F4_tool108
    add(f4_tool108_1.part, mode=Mode.SUBTRACT)


with BuildPart() as f4_tool119:
    # F4_s120 → F4_t121 (new body)
    with BuildSketch(Plane.YZ.offset(-47.6931828042)):
        with BuildLine():
            ThreePointArc((-25, 5), (-23.5355339059, 1.4644660941), (-20, 0))
            Line((-20, 0), (-25, 0))
            Line((-25, 0), (-25, 5))
        make_face()
    extrude(amount=F4_T121_DEPTH)

    split(bisect_by=Plane.YZ.offset(-35.1931828042), keep=Keep.BOTTOM)


with BuildPart() as f4_tool123:
    # F4_s124 → F4_t125 (new body)
    with BuildSketch(Plane.XY.offset(-23.1846483105)):
        with BuildLine():
            ThreePointArc((-40.1931828042, -25), (-36.6576488983, -23.5355339059), (-35.1931828042, -20))
            Line((-35.1931828042, -20), (-35.1931828042, -25))
            Line((-35.1931828042, -25), (-40.1931828042, -25))
        make_face()
    extrude(amount=F4_T125_DEPTH)

    split(bisect_by=Plane.XY, keep=Keep.TOP)


with BuildPart() as f4_tool119_1:
    add(f4_tool119.part)

    # F4_t127: intersect F4_tool123
    add(f4_tool123.part, mode=Mode.INTERSECT)


with BuildPart() as f1_13:
    add(f1_12.part)

    # F4_t117: cut F4_tool119
    add(f4_tool119_1.part, mode=Mode.SUBTRACT)


with BuildPart() as f4_tool130:
    # F4_s131 → F4_t132 (new body)
    with BuildSketch(Plane.YZ.offset(-47.6931828042)):
        with BuildLine():
            ThreePointArc((-5, 0), (-1.4644660941, 1.4644660941), (0, 5))
            Line((0, 5), (0, 0))
            Line((0, 0), (-5, 0))
        make_face()
    extrude(amount=F4_T132_DEPTH)

    split(bisect_by=Plane.YZ.offset(-35.1931828042), keep=Keep.BOTTOM)


with BuildPart() as f4_tool134:
    # F4_s135 → F4_t136 (new body)
    with BuildSketch(Plane.XY.offset(-23.1846483105)):
        with BuildLine():
            ThreePointArc((-35.1931828042, -5), (-36.6576488983, -1.4644660941), (-40.1931828042, 0))
            Line((-40.1931828042, 0), (-35.1931828042, 0))
            Line((-35.1931828042, 0), (-35.1931828042, -5))
        make_face()
    extrude(amount=F4_T136_DEPTH)

    split(bisect_by=Plane.XY, keep=Keep.TOP)


with BuildPart() as f4_tool130_1:
    add(f4_tool130.part)

    # F4_t138: intersect F4_tool134
    add(f4_tool134.part, mode=Mode.INTERSECT)


with BuildPart() as f1_14:
    add(f1_13.part)

    # F4_t128: cut F4_tool130
    add(f4_tool130_1.part, mode=Mode.SUBTRACT)

    # F5
    f5_edges = [f1_14.edges().sort_by_distance(p)[0] for p in [
        (-72.999563, -12.5, 56.286573),
        (-61.096373, -25, 56.286573),
        (-61.096373, 0, 56.286573),
        (-72.120884, -0.87868, 56.286573),
        (-72.120884, -24.12132, 56.286573),
    ]]
    fillet(f5_edges, radius=F5_R)

    # F6: fillet of radius 5 on 1 edges, made by hand

    # F6_s2 → F6_t1 (cut)
    with BuildSketch(Plane.XZ.offset(5)):
        with BuildLine():
            ThreePointArc((0, -23.1846483105), (1.4644660941, -26.7201822165), (5, -28.1846483105))
            Line((5, -28.1846483105), (0, -28.1846483105))
            Line((0, -28.1846483105), (0, -23.1846483105))
        make_face()
    extrude(amount=F6_T1_DEPTH, mode=Mode.SUBTRACT)


with BuildPart() as f6_tool4:
    # F6_s5 → F6_t6 (new body)
    with BuildSketch(Plane.YZ.offset(5)):
        with Locations((-2.5, -25.6846483105)):
            Rectangle(F6_S5_W, F6_S5_H)
    extrude(amount=-F6_T6_DEPTH)

    # F6_s7 → F6_t8 (revolve, cut)
    with BuildSketch(Plane(origin=(5, -5, -23.1846483105), x_dir=(0, -0.7071067812, 0.7071067812), z_dir=(0, -0.7071067812, -0.7071067812))):
        with BuildLine():
            ThreePointArc((0, -5), (5, 0), (0, 5))
            Line((0, 5), (0, -5))
        make_face()
    revolve(axis=Axis((5, -5, -23.1846483105), (-1, 0, 0)), mode=Mode.SUBTRACT)


with BuildPart() as f1_15:
    add(f1_14.part)

    # F6_t3: cut F6_tool4
    add(f6_tool4.part, mode=Mode.SUBTRACT)


with BuildPart() as f6_tool10:
    # F6_s11 → F6_t12 (new body)
    with BuildSketch(Plane.YZ.offset(5)):
        with Locations((-22.5, -25.6846483105)):
            Rectangle(F6_S11_W, F6_S11_H)
    extrude(amount=-F6_T12_DEPTH)

    # F6_s13 → F6_t14 (revolve, cut)
    with BuildSketch(Plane(origin=(5, -20, -23.1846483105), x_dir=(0, 0.7071067812, 0.7071067812), z_dir=(0, -0.7071067812, 0.7071067812))):
        with BuildLine():
            ThreePointArc((0, -5), (5, 0), (0, 5))
            Line((0, 5), (0, -5))
        make_face()
    revolve(axis=Axis((5, -20, -23.1846483105), (-1, 0, 0)), mode=Mode.SUBTRACT)


with BuildPart() as f1_16:
    add(f1_15.part)

    # F6_t9: cut F6_tool10
    add(f6_tool10.part, mode=Mode.SUBTRACT)

    # F7 (on face) → F8 (join)
    with BuildSketch(Plane.XY.offset(71.8153516895)):
        Polygon((-46.3257431984, -16.549365595), (-52.3090921342, -19.1820412874), (-40.1931828042, -20), align=None)
        Polygon((-40.4822512322, -6.7235301125), (-52.5981605622, -5.9055713999), (-46.5402058972, -9.130010847), align=None)
    extrude(amount=F8_DEPTH)


solid = f1_16.part
